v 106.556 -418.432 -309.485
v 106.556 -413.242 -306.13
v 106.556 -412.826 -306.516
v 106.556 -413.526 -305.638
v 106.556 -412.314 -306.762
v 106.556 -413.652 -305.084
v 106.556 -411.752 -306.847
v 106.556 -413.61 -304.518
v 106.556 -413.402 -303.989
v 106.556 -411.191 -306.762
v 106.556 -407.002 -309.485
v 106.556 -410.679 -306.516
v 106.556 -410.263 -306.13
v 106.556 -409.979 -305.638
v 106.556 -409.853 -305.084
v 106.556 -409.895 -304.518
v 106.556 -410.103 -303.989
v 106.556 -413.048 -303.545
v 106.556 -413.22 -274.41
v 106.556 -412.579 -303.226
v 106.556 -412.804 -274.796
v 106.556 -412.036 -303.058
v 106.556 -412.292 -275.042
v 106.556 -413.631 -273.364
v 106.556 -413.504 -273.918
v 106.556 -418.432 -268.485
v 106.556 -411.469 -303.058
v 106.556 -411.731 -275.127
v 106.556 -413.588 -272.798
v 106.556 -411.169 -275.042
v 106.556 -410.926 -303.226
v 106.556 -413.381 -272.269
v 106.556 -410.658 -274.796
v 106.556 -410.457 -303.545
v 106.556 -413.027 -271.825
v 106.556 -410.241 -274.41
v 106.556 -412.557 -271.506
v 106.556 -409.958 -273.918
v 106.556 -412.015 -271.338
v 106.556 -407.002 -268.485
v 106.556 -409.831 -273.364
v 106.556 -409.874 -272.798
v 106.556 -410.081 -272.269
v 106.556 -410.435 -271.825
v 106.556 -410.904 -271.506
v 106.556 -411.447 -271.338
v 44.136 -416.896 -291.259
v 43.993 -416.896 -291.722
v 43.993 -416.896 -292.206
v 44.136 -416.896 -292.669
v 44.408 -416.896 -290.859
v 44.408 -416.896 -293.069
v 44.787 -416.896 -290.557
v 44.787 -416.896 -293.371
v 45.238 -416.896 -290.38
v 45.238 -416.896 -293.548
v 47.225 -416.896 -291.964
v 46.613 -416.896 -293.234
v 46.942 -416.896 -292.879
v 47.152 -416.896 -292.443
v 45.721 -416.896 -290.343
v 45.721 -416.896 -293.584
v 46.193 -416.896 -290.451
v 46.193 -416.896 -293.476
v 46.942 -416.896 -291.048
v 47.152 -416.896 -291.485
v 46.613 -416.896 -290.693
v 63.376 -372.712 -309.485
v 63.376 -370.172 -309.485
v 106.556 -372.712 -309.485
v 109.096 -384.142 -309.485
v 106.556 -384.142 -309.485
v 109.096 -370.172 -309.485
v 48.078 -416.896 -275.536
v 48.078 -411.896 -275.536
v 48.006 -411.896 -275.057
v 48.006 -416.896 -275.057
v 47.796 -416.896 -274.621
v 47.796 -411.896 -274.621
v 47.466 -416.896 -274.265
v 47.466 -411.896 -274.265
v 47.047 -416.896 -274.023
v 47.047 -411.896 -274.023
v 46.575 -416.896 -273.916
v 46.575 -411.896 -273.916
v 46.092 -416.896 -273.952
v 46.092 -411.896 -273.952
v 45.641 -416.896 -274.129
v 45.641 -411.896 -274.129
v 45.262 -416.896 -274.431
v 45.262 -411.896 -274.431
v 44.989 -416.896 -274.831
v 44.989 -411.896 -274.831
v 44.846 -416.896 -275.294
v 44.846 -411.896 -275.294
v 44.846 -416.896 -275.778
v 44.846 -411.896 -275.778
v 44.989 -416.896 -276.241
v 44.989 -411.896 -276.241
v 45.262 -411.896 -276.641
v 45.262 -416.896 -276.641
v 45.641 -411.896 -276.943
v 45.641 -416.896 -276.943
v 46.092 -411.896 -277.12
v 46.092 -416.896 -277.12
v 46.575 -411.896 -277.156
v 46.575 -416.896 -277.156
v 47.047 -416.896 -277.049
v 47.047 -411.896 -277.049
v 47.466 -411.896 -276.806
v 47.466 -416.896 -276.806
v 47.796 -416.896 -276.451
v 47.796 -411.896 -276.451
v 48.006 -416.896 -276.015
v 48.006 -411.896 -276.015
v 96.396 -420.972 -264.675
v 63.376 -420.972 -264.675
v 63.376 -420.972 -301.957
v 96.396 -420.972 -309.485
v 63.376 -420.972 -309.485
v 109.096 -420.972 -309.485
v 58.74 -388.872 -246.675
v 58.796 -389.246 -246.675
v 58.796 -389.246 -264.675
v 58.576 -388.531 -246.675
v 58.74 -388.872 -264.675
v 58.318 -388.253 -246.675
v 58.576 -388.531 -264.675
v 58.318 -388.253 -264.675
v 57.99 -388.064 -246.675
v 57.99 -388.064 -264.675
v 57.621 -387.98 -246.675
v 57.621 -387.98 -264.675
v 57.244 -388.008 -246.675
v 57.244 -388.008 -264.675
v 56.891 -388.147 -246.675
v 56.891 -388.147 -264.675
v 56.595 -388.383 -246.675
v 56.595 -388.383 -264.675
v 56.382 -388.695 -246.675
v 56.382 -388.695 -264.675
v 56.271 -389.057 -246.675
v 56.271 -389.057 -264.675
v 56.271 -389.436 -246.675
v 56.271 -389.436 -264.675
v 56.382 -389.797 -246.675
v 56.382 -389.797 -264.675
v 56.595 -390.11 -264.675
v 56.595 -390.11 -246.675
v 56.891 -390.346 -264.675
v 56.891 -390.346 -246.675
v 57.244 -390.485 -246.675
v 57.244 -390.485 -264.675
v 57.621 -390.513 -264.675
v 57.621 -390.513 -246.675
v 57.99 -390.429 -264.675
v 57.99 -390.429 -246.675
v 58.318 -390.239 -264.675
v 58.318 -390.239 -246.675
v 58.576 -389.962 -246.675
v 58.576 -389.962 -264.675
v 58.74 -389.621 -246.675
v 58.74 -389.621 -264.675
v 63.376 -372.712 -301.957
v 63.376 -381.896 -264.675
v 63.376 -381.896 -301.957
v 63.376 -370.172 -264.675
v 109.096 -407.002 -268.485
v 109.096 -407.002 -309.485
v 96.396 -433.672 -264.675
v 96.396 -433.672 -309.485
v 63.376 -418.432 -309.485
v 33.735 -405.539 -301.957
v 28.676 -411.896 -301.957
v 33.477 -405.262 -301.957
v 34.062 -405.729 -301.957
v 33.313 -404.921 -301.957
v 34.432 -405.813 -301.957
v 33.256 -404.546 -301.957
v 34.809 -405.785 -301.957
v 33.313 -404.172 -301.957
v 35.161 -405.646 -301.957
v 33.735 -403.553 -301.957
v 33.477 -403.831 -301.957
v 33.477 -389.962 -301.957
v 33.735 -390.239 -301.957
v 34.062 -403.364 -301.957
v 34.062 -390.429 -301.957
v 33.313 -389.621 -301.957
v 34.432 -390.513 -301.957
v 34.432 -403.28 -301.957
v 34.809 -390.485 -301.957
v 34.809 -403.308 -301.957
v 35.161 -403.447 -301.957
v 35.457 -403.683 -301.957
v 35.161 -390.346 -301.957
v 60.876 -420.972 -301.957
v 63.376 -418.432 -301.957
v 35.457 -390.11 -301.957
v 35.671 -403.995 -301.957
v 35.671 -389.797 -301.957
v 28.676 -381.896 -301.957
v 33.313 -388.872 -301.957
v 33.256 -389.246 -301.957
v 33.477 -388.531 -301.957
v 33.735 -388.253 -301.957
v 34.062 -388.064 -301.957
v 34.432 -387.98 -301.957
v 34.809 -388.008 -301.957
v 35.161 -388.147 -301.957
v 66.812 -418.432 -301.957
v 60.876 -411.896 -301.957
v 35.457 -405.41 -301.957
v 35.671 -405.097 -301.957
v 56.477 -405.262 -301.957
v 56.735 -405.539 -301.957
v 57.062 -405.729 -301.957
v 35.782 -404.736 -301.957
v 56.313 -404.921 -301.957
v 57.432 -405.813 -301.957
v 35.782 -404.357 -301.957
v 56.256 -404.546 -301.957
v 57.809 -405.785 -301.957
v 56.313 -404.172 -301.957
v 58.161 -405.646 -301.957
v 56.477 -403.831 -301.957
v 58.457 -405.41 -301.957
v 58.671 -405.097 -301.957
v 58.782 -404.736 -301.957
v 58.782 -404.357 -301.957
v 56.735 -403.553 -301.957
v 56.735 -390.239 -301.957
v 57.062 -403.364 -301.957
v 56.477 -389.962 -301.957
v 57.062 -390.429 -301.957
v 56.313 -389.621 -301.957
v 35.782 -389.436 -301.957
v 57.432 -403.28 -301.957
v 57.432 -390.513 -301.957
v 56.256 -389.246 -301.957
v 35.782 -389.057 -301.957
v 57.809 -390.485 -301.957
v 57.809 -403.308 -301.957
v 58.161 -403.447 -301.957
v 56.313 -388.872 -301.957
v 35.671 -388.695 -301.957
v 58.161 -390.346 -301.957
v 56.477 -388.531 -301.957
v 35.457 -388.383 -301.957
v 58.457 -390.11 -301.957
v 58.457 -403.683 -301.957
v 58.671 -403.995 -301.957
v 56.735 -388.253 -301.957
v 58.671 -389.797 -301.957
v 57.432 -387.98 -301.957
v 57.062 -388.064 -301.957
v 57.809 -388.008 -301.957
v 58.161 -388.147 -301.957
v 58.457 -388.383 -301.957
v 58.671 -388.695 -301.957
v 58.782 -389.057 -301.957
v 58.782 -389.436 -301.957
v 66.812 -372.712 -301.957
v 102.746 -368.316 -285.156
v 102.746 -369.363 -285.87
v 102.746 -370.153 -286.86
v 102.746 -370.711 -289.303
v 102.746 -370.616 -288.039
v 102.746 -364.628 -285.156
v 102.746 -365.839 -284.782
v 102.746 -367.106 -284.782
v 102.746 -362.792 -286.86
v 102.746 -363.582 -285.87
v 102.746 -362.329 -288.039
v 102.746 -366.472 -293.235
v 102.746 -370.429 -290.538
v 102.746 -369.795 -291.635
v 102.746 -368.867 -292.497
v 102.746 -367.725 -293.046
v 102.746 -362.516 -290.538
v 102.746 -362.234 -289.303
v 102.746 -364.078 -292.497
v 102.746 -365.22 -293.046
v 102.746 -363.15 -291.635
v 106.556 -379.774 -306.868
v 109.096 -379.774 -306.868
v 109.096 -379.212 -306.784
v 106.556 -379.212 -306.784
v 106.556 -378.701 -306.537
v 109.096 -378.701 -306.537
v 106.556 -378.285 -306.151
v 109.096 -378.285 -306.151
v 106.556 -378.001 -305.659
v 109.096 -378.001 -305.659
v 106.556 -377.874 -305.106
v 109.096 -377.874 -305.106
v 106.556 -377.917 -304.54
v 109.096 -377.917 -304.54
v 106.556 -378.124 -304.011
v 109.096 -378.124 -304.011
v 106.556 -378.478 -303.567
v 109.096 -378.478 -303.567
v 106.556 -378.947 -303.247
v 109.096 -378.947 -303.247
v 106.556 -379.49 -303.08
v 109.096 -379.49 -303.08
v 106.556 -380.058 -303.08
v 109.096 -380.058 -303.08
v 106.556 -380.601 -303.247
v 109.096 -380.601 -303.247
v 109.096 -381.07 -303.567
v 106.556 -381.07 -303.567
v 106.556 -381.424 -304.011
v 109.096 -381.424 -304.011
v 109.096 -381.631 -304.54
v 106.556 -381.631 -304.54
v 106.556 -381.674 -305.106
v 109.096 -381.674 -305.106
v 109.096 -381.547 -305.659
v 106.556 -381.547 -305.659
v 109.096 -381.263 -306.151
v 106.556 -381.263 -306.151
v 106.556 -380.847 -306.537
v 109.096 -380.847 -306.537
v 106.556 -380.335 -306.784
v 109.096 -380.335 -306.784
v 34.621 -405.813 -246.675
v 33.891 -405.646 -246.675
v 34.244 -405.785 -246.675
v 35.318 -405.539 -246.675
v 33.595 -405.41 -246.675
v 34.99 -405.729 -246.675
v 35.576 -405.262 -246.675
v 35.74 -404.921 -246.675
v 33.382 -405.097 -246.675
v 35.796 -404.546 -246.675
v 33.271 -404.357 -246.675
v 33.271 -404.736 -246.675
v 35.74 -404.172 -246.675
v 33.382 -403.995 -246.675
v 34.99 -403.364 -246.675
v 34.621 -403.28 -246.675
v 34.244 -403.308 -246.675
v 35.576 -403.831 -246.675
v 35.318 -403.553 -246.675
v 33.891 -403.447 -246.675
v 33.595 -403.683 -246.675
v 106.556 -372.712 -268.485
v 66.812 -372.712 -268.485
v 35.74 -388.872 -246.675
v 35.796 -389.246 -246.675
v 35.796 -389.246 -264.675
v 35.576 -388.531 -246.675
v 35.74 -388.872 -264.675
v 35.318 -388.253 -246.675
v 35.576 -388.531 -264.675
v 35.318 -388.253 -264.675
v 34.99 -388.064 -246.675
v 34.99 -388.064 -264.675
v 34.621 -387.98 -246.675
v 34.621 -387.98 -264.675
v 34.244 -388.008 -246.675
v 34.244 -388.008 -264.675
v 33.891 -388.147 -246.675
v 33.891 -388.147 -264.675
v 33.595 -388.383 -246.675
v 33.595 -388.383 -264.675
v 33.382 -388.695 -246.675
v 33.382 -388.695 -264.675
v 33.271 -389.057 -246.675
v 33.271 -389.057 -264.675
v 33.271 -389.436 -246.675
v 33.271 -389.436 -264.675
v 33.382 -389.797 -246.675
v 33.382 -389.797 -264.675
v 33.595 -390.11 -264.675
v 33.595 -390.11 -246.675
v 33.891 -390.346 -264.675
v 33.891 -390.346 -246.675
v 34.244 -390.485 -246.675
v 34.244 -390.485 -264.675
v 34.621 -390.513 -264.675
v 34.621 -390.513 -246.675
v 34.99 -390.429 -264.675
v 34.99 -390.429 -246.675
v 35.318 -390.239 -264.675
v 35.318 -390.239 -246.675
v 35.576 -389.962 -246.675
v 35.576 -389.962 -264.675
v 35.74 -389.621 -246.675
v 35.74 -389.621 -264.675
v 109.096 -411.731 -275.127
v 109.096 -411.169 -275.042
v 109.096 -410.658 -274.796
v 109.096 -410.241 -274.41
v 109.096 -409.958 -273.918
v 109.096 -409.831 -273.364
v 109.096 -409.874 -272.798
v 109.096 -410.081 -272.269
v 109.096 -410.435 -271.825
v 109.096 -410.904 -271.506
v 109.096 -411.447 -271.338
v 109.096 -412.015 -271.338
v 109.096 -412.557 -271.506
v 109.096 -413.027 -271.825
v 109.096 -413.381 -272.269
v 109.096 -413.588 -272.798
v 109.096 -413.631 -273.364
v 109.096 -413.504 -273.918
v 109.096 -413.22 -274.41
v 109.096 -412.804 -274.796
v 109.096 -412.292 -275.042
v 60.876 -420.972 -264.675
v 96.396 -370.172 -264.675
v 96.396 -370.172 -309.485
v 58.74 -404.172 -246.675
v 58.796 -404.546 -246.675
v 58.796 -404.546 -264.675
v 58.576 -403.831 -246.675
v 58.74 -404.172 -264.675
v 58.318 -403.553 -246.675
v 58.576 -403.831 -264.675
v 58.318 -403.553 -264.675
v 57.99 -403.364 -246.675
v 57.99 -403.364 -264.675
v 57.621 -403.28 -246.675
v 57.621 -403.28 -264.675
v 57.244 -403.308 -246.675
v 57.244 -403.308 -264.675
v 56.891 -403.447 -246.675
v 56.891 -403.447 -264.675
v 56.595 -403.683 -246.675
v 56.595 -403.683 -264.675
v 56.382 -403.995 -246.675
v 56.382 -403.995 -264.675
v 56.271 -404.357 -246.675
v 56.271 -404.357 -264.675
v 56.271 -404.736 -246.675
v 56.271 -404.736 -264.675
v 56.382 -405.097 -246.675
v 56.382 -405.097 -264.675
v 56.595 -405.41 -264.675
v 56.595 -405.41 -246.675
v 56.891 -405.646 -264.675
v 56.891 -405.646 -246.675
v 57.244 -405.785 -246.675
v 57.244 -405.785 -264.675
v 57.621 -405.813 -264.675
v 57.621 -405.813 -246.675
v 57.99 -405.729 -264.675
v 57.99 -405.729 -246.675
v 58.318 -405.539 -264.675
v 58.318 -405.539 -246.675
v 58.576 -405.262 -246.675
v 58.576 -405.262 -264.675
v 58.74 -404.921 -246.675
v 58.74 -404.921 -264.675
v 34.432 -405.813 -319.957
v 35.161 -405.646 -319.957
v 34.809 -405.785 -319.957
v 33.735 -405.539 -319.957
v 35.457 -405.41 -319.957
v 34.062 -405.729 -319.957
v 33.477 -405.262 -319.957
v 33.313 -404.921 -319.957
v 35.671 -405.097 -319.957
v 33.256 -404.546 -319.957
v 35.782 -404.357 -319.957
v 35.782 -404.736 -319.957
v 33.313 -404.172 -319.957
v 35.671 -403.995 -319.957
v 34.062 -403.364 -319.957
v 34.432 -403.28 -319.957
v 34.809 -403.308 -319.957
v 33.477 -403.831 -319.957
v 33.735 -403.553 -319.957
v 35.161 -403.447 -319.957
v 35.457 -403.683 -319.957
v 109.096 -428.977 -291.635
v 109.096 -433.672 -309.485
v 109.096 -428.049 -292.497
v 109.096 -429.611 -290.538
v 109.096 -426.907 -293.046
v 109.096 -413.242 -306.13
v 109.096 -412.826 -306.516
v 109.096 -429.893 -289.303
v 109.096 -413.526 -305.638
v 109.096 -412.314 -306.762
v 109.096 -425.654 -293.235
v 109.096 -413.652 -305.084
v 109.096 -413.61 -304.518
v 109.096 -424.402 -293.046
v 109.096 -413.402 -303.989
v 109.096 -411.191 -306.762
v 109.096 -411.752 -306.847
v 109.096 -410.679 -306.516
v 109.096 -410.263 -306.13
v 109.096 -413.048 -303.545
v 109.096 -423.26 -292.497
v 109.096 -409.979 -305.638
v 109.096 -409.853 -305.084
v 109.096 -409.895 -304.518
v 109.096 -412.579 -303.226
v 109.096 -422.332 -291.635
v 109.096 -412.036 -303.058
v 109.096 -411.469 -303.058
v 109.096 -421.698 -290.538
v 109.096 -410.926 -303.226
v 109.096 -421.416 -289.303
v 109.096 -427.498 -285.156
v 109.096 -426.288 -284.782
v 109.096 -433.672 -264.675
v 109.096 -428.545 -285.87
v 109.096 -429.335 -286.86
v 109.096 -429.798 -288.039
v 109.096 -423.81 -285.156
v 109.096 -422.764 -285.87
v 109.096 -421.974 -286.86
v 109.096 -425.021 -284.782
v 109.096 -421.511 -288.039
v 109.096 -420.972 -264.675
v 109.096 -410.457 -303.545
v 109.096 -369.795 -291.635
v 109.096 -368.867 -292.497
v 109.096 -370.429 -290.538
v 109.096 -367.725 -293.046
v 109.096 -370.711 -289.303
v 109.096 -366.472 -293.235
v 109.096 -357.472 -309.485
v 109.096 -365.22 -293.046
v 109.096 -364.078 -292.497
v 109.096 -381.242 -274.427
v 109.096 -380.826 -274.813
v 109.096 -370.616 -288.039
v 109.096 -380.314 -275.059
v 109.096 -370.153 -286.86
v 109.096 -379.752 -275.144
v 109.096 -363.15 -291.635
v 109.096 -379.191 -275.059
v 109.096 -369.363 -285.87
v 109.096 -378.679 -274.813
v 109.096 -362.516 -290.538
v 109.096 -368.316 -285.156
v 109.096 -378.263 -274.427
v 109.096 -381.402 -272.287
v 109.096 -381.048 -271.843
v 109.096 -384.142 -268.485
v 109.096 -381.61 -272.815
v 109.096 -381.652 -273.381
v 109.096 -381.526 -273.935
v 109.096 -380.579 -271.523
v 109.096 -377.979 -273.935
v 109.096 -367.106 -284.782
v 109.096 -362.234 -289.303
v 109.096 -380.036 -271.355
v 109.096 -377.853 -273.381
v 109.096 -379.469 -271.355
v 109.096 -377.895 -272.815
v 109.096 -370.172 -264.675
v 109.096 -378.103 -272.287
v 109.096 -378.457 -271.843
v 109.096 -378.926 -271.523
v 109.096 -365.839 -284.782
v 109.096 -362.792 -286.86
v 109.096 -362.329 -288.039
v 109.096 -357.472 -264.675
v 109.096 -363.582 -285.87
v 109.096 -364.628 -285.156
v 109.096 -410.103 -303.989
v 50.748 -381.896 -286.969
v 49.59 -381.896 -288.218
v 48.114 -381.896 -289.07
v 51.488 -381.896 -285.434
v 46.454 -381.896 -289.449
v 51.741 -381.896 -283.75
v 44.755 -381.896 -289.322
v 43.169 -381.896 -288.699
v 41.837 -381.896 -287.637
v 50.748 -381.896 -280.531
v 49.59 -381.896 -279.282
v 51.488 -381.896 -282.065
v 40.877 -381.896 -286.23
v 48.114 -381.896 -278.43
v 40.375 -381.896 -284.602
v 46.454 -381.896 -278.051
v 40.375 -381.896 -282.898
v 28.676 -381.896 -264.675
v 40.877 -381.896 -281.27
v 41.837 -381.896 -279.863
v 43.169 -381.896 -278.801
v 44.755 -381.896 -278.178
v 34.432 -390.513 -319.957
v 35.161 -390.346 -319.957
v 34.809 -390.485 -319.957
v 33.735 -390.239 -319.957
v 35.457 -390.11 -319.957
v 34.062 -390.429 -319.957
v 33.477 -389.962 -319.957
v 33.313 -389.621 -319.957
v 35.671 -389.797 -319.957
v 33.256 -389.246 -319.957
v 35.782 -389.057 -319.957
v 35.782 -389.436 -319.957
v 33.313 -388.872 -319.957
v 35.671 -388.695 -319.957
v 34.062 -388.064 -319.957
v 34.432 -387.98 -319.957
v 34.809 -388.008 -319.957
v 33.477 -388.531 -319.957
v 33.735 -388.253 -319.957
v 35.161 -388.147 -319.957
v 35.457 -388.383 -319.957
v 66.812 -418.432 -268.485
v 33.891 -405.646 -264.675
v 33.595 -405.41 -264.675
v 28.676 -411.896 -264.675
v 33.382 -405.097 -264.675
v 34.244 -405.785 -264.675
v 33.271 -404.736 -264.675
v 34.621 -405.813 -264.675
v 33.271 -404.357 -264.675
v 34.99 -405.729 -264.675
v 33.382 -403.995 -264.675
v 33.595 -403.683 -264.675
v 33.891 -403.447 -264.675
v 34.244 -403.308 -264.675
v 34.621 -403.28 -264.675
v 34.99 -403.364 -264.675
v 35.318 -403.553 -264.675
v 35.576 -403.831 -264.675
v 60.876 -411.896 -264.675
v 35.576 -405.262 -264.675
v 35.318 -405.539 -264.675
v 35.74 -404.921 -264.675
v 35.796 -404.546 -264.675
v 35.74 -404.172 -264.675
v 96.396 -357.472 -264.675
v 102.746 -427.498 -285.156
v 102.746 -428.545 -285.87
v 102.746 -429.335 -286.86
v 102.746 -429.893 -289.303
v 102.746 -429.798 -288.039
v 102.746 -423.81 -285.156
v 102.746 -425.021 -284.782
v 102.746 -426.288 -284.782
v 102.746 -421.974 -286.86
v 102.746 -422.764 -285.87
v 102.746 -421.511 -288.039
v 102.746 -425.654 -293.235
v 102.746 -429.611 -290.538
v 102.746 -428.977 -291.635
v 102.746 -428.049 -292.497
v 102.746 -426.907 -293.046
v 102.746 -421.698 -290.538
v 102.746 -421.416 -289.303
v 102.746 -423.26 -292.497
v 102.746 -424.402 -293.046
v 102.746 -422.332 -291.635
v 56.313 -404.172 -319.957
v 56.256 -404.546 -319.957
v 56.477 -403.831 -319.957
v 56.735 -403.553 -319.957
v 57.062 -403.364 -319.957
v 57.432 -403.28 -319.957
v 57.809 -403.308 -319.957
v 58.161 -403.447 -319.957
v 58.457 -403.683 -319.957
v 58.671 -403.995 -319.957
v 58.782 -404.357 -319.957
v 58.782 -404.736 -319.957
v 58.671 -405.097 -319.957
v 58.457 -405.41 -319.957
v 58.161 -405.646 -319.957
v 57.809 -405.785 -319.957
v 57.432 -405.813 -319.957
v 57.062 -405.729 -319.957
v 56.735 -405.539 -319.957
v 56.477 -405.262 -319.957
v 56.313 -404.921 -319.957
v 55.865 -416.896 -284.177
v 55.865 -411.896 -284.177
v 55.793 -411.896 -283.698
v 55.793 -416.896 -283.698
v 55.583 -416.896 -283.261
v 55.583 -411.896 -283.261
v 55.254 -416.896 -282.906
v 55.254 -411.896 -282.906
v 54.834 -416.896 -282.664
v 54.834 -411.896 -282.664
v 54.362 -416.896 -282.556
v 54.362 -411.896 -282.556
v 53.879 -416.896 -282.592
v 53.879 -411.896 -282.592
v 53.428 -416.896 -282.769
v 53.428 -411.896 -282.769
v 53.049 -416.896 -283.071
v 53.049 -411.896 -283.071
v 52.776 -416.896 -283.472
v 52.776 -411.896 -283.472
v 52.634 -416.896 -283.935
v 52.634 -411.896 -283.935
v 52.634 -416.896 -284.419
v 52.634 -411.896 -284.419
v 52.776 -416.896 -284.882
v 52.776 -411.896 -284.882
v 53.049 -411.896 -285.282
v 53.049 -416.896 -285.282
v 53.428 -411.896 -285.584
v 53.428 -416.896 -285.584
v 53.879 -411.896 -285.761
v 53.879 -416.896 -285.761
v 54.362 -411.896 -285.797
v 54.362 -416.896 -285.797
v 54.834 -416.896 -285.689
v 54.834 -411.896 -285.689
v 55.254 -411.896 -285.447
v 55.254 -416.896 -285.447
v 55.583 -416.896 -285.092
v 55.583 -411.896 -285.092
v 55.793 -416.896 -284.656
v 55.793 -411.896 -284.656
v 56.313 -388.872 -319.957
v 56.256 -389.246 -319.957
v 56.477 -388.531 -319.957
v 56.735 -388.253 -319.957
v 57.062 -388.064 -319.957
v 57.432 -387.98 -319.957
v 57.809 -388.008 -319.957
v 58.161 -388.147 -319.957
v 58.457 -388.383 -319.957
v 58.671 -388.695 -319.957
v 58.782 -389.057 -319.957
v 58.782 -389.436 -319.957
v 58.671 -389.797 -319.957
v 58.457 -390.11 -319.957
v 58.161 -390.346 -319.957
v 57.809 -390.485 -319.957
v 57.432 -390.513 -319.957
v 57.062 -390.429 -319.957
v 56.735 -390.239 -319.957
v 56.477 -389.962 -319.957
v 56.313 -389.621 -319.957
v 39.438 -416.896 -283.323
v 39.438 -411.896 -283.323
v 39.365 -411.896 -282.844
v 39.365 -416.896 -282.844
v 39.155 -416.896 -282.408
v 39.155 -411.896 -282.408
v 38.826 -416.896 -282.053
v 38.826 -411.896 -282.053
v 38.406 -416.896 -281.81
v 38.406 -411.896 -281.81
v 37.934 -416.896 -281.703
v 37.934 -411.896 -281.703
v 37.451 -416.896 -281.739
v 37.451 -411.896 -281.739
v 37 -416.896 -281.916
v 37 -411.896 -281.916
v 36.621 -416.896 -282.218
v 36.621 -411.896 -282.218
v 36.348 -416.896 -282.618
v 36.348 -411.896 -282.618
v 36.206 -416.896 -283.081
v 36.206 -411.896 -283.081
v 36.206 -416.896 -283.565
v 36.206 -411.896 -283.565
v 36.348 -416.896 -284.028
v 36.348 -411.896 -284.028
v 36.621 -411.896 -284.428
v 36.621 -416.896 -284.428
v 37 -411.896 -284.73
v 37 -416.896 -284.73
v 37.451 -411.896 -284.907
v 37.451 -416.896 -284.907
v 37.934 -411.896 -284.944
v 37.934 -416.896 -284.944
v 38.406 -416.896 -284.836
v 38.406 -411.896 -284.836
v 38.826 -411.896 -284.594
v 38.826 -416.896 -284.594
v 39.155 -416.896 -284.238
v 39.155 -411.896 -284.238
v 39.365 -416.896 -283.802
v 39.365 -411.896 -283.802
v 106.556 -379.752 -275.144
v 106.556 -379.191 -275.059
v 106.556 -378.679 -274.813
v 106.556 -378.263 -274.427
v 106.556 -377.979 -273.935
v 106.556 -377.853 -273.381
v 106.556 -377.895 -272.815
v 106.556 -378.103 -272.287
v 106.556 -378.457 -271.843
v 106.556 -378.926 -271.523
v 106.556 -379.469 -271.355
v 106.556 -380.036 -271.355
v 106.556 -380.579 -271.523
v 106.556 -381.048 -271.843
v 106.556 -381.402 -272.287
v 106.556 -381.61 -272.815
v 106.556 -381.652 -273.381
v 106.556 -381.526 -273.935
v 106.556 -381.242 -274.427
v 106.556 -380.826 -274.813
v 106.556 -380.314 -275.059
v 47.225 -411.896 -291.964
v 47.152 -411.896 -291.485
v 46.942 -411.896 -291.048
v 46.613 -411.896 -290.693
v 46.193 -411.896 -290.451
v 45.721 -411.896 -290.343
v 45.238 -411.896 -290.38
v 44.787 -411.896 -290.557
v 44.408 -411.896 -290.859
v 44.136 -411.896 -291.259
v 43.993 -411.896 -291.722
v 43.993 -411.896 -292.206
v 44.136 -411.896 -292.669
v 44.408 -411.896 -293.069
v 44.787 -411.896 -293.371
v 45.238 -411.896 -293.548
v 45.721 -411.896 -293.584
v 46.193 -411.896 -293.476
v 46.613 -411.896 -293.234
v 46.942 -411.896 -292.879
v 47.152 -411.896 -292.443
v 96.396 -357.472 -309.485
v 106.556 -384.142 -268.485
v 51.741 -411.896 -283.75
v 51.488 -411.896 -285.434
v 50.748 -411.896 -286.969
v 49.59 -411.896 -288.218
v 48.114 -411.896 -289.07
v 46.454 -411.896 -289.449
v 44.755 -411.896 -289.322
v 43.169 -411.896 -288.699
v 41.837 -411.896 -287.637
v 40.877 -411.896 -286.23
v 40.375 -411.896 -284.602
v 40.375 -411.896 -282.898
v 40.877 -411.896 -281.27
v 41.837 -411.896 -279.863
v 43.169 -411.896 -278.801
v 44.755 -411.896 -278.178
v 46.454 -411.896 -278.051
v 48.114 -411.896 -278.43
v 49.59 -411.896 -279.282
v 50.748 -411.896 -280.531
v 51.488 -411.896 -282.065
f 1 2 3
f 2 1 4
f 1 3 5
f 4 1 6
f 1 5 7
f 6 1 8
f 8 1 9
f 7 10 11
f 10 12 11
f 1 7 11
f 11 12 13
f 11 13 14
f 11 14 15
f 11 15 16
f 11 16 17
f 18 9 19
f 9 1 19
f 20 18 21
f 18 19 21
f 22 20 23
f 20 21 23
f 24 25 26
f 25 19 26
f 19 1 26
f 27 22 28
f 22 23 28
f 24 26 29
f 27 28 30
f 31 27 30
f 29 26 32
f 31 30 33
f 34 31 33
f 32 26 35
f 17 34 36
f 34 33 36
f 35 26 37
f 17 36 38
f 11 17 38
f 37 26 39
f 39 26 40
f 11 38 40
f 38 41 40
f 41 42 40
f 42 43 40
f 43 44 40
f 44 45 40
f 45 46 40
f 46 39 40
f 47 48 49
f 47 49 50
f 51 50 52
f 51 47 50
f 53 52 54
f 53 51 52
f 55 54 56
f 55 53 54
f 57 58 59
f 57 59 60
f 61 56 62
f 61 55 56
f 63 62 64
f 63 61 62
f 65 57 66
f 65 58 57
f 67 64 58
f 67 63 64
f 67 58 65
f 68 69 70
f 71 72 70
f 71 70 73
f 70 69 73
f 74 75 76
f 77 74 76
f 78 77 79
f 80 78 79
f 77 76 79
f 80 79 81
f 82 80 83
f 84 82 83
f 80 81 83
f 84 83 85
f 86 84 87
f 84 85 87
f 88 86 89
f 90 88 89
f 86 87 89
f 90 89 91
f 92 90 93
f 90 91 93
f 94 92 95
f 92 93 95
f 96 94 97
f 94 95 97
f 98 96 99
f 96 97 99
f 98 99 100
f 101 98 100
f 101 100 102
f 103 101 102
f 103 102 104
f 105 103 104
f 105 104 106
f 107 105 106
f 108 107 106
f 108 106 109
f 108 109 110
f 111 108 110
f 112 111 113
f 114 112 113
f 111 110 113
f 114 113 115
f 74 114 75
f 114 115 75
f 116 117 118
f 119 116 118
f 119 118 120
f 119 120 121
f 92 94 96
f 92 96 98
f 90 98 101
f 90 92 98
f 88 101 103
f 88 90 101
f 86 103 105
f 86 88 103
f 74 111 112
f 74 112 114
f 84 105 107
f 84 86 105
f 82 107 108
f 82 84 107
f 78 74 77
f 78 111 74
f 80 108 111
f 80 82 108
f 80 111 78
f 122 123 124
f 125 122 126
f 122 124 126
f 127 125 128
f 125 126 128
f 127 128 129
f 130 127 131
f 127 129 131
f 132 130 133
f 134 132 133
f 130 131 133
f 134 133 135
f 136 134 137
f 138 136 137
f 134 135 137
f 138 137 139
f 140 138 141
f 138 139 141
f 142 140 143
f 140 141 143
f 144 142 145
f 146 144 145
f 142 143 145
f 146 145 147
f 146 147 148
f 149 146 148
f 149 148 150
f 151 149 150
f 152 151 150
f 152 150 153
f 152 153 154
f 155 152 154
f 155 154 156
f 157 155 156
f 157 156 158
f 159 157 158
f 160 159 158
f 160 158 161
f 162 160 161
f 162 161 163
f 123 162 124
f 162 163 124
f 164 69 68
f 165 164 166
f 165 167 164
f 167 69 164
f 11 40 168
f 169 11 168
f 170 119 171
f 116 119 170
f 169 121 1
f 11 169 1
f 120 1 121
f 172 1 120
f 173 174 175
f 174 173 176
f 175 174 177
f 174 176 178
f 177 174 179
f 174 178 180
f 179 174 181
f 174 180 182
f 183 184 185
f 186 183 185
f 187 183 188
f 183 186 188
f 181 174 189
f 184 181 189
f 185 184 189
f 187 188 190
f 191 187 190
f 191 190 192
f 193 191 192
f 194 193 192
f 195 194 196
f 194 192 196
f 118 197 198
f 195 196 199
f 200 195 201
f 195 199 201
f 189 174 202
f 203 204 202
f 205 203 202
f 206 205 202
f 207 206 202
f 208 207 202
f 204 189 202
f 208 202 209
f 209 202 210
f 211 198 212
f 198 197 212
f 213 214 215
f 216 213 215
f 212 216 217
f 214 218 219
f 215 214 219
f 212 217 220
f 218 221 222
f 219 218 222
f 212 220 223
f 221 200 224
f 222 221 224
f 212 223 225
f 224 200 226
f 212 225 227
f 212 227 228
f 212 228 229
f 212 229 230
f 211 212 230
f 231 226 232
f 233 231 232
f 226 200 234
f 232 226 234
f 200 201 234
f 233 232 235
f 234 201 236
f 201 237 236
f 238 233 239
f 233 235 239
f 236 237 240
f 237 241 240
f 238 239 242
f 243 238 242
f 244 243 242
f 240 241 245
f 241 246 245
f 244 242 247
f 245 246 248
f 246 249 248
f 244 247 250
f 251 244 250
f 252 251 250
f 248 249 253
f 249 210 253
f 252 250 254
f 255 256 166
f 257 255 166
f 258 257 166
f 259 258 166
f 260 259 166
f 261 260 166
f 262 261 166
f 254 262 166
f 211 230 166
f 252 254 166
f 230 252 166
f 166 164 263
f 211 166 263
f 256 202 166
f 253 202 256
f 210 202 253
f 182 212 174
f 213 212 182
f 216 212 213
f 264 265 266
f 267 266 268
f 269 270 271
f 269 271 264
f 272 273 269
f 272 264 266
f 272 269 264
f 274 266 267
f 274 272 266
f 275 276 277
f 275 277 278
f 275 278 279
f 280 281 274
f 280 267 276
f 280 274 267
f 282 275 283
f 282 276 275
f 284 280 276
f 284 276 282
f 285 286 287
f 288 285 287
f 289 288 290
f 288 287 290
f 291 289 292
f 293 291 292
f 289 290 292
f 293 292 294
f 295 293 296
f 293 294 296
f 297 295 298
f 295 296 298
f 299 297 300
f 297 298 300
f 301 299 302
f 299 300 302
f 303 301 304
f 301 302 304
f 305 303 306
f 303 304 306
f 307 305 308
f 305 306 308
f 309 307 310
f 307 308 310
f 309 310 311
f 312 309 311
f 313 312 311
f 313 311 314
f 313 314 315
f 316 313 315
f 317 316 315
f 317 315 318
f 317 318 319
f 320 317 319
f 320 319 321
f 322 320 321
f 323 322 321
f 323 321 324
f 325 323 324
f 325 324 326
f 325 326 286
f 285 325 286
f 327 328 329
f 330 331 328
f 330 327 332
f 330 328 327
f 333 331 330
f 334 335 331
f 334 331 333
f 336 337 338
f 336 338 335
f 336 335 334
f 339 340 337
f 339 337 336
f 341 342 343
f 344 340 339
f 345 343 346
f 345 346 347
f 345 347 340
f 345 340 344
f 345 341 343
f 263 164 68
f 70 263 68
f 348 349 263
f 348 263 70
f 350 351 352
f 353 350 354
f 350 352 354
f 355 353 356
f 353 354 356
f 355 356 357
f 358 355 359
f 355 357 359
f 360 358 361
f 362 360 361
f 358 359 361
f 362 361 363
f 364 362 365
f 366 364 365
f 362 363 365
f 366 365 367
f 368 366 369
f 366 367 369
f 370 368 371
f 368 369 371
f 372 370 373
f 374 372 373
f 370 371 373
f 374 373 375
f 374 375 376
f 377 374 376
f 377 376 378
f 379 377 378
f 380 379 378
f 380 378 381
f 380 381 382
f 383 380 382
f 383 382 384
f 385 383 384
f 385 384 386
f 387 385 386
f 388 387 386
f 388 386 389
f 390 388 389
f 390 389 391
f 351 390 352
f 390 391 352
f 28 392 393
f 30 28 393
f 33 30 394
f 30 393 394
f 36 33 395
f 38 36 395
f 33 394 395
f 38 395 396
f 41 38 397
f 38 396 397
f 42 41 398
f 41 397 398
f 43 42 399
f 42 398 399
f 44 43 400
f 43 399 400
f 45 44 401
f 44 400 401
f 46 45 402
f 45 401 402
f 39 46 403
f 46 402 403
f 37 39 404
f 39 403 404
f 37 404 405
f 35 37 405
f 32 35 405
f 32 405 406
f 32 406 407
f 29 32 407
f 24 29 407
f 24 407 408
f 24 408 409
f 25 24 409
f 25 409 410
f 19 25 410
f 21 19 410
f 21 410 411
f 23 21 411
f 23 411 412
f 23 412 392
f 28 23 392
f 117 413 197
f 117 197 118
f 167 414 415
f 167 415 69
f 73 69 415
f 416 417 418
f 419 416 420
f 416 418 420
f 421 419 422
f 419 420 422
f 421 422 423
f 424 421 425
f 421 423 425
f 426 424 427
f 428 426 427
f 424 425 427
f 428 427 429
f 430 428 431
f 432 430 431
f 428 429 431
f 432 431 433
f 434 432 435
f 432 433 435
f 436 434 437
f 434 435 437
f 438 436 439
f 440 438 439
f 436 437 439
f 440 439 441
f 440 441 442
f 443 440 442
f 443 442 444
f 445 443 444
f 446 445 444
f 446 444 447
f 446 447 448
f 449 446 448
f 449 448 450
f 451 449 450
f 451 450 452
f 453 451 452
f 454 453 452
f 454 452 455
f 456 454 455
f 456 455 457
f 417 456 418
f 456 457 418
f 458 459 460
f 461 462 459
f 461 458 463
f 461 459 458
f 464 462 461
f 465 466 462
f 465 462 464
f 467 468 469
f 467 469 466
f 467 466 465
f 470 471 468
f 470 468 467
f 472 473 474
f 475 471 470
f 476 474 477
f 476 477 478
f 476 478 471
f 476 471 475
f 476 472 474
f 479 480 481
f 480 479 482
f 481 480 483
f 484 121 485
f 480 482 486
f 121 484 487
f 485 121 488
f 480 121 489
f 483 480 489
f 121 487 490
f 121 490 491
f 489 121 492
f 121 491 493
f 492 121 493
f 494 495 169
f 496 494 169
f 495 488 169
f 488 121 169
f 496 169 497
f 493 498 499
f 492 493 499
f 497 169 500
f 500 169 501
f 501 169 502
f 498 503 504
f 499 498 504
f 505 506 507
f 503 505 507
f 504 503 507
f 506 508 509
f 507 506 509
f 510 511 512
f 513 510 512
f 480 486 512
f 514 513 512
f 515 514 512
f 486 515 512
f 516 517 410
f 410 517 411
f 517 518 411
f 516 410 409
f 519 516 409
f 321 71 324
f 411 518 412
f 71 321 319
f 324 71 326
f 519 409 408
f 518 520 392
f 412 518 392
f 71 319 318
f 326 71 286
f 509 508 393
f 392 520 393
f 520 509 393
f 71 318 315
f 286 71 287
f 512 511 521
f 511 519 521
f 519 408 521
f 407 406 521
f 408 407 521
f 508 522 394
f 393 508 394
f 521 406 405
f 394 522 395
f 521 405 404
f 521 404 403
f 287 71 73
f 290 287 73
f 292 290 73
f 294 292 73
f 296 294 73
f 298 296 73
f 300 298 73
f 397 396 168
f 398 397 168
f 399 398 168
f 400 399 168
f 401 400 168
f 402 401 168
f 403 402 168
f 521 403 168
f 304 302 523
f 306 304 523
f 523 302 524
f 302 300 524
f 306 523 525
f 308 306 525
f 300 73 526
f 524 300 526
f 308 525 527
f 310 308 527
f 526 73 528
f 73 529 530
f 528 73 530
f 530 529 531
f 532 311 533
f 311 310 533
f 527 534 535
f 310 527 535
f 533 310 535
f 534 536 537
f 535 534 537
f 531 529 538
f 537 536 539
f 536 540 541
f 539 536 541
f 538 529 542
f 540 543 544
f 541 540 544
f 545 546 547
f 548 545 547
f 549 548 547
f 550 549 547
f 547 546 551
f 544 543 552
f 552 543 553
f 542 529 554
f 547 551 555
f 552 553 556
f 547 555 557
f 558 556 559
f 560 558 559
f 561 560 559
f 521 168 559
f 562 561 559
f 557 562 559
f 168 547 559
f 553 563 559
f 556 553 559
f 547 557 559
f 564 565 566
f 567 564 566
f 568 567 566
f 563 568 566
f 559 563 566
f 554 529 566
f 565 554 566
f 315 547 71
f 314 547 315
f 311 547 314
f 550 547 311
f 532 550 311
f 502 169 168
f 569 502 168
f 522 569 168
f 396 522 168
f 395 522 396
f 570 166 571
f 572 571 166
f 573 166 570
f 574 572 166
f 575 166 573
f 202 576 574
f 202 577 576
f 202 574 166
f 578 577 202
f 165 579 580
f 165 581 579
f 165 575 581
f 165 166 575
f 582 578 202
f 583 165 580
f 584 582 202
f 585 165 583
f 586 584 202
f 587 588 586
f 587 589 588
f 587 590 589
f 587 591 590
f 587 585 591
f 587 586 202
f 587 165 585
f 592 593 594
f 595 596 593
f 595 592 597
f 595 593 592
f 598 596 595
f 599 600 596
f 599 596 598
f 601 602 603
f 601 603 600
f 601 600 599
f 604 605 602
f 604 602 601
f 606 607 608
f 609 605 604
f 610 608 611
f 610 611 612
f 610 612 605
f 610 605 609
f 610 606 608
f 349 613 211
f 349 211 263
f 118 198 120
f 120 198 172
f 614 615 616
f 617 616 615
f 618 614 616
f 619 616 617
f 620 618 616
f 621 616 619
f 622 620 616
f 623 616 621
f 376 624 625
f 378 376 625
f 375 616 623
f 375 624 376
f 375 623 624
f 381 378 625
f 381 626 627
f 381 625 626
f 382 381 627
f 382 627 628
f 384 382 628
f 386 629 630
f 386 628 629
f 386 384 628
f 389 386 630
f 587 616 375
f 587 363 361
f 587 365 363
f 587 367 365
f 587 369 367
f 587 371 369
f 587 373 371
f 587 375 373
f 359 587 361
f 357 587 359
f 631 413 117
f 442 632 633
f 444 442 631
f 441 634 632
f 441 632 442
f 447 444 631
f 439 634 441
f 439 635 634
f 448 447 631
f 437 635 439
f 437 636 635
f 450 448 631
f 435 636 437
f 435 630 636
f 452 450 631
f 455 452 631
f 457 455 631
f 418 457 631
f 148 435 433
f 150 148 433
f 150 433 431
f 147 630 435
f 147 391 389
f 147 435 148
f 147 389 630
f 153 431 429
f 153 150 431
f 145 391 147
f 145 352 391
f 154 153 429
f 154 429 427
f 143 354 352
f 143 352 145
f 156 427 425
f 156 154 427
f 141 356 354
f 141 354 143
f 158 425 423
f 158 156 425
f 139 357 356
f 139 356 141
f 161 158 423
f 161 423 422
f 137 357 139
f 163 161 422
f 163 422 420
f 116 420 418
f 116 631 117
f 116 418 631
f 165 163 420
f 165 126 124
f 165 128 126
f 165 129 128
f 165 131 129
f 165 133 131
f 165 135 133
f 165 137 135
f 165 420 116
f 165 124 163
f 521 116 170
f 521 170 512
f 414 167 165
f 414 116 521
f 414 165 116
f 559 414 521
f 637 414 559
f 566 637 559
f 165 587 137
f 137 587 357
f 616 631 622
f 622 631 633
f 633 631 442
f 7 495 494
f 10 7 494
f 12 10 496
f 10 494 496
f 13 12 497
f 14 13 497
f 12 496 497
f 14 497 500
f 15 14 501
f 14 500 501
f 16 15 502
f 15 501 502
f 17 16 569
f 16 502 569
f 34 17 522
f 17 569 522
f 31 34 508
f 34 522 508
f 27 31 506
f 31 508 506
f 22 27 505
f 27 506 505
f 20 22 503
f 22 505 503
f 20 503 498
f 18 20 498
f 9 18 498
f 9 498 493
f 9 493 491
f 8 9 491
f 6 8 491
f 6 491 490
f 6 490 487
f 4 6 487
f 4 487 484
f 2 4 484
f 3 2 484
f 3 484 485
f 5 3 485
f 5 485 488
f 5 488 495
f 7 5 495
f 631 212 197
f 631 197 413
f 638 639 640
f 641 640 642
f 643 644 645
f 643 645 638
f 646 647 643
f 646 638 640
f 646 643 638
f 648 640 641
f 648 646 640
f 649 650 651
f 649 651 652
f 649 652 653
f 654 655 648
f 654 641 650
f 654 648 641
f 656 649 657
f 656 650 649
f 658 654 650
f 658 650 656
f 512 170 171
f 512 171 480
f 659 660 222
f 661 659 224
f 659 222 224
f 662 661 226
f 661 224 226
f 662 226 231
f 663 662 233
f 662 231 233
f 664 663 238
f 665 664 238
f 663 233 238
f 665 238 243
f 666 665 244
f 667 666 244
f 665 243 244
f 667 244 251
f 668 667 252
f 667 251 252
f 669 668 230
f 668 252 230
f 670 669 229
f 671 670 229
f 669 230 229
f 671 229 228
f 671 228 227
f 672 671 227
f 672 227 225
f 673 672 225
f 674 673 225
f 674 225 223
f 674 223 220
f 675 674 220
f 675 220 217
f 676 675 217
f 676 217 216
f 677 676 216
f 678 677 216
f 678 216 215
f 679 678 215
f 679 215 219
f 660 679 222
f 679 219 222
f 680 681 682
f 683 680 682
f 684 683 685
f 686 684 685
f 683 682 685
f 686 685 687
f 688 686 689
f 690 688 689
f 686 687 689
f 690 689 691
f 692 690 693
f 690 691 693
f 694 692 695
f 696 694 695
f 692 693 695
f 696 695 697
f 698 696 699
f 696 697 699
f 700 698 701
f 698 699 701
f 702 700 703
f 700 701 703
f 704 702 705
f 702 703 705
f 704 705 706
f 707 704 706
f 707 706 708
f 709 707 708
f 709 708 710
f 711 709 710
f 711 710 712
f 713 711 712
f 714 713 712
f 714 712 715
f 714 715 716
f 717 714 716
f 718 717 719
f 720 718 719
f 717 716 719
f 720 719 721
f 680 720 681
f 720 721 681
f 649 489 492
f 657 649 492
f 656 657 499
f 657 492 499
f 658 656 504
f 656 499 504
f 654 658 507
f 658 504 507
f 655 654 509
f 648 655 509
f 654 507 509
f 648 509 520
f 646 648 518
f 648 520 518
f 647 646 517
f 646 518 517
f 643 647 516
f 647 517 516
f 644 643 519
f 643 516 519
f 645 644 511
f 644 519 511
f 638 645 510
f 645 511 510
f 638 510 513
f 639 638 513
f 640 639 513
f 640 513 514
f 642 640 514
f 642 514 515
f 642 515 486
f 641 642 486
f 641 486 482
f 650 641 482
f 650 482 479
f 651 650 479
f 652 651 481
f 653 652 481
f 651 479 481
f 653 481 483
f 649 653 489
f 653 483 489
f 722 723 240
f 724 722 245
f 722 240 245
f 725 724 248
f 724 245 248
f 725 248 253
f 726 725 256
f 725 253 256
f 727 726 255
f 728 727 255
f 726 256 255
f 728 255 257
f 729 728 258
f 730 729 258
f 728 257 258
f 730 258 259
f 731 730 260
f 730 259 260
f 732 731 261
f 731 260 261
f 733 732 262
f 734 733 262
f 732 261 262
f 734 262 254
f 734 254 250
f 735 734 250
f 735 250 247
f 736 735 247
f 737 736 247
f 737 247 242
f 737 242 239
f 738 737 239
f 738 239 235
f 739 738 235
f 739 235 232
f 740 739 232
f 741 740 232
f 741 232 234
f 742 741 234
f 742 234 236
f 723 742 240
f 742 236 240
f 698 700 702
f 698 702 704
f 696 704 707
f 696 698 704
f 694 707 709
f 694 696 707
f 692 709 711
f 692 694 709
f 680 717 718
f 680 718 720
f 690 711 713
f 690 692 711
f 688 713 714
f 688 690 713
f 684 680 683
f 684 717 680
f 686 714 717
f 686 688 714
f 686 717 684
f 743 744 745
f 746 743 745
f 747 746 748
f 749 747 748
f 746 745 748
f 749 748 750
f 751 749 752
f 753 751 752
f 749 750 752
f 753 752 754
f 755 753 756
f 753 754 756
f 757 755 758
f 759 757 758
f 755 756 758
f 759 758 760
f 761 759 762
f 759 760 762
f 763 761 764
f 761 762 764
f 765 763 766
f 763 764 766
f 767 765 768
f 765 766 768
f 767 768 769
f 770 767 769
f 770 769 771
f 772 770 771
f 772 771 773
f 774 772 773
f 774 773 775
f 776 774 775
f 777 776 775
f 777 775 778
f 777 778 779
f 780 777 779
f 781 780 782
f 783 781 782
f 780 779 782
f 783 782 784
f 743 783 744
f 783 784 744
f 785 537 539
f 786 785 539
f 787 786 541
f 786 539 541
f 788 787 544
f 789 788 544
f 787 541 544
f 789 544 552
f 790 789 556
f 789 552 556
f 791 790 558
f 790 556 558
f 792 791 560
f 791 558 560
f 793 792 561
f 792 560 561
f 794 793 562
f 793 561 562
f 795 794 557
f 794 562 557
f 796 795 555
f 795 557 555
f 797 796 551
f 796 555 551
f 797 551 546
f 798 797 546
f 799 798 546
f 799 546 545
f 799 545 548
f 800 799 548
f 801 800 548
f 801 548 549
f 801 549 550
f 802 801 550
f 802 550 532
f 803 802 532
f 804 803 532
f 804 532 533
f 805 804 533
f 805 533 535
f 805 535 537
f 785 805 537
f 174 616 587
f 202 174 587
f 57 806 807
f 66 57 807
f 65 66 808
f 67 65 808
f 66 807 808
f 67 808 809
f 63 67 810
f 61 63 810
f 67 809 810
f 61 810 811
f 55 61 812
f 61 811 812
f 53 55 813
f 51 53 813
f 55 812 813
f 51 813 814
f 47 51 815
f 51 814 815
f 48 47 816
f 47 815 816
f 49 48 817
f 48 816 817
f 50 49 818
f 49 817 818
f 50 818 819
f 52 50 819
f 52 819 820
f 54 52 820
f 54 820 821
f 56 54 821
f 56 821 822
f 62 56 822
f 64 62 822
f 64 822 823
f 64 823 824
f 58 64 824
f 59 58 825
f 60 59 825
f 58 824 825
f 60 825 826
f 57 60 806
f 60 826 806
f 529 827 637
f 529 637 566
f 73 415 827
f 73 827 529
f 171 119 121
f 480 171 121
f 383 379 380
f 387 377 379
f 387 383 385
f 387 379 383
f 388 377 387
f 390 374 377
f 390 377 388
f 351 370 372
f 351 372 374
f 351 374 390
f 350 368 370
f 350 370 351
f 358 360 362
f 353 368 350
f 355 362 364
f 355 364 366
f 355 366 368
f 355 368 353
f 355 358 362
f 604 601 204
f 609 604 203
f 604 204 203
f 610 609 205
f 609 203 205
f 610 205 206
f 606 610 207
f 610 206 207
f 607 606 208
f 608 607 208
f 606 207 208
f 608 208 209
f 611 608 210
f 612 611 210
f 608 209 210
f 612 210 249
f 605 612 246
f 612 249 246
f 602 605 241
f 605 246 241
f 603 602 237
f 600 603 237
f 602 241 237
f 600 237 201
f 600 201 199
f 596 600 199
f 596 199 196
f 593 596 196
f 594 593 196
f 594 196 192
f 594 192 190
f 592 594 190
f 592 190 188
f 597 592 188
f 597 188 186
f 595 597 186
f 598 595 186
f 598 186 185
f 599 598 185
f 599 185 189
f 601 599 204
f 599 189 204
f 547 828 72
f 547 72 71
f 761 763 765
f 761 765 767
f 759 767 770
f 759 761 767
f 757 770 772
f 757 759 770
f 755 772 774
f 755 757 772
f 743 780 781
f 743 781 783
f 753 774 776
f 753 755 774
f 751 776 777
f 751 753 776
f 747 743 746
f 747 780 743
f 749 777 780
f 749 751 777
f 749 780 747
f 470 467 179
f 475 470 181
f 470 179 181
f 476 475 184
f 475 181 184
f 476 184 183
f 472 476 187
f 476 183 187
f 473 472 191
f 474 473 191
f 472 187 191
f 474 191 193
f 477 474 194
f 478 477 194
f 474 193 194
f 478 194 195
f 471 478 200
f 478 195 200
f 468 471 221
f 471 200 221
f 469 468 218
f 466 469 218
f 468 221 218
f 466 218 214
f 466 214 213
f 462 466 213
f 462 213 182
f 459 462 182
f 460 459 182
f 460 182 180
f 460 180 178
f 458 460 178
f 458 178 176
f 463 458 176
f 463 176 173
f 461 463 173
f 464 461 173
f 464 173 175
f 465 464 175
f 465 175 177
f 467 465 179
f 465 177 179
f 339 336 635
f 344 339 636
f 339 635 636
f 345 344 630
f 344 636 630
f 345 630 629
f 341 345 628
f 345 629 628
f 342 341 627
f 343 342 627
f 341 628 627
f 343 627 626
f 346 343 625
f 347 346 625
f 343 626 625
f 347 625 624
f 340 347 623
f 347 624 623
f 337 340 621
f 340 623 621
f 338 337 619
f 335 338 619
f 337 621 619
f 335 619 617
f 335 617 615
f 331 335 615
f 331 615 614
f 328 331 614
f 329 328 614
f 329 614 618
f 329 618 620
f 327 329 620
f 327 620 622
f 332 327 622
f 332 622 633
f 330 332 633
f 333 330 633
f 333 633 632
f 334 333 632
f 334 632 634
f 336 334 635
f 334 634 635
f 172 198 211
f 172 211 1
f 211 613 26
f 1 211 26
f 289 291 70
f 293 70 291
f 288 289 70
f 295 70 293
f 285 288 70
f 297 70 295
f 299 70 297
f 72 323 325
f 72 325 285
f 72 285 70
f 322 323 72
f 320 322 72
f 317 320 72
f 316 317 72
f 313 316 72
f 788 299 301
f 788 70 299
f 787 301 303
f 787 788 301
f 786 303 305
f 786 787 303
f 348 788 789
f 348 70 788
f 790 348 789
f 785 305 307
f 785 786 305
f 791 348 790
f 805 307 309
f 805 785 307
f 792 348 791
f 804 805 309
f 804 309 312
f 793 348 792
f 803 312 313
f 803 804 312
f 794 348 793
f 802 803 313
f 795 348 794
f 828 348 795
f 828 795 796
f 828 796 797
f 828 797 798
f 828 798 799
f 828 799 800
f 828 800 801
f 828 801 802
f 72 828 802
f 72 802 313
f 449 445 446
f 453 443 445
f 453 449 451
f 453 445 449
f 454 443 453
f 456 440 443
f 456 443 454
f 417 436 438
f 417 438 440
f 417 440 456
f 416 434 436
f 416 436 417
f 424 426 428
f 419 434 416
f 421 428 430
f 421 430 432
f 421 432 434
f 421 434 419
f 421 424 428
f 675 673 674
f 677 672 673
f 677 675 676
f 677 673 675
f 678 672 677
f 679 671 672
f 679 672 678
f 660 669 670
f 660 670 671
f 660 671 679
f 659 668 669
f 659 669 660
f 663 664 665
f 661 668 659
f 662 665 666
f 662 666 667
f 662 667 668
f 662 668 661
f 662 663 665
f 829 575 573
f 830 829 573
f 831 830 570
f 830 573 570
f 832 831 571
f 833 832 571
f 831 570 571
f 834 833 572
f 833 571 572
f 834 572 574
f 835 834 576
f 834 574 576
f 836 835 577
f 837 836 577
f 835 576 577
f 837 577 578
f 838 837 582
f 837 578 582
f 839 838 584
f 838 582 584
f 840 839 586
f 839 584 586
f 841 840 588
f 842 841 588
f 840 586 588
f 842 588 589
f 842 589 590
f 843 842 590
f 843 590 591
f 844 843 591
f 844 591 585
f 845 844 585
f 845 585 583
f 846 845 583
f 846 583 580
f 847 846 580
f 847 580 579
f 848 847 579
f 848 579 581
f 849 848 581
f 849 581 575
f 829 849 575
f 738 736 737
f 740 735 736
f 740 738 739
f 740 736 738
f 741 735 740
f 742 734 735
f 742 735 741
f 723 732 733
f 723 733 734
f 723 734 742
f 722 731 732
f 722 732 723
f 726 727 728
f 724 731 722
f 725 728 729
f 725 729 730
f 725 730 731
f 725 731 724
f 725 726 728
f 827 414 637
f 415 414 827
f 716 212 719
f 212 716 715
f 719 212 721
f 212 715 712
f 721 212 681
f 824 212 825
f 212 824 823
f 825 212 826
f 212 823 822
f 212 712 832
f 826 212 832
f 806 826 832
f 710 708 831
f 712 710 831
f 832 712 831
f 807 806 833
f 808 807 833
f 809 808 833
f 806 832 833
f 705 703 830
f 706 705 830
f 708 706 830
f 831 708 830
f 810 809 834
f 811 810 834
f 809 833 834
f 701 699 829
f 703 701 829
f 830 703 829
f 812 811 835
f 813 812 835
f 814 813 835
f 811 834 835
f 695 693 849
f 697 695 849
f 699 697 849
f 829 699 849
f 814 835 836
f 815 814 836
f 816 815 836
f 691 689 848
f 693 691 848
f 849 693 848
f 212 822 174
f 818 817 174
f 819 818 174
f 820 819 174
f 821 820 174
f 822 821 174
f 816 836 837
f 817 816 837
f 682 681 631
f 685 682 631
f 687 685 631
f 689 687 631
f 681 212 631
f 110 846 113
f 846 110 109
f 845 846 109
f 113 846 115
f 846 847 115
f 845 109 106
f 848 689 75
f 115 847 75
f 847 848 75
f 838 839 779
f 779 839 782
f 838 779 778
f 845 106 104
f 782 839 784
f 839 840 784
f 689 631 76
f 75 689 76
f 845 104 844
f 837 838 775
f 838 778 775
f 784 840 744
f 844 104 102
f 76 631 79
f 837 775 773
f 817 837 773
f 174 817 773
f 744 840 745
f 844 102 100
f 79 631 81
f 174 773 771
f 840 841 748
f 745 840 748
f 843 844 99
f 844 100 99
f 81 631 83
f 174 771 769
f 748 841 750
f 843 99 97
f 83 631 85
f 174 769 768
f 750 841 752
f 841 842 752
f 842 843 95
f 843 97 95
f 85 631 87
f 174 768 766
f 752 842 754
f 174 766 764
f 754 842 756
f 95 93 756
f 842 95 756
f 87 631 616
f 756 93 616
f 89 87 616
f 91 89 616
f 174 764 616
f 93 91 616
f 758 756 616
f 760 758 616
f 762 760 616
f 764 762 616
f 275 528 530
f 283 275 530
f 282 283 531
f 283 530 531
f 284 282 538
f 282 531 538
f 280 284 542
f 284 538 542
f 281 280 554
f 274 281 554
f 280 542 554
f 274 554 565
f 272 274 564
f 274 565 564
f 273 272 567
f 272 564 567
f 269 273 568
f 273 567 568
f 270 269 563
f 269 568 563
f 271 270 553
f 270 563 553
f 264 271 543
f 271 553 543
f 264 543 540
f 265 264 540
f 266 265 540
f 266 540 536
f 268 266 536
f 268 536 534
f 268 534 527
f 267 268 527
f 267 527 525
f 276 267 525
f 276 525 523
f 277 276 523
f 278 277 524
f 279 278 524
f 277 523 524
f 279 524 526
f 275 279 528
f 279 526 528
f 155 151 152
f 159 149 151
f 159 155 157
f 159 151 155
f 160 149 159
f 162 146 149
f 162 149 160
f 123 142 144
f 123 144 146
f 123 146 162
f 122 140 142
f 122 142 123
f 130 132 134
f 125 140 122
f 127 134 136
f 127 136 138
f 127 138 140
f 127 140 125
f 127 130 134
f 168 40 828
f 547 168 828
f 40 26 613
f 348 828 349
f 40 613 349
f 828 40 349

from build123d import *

# Parameters (mm, degrees)
SKETCH1_W            = 34.7
SKETCH1_H            = 30
BOSS_EXTRUDE1_DEPTH  = 37.282
SKETCH2_R            = 1.27
BOSS_EXTRUDE2_DEPTH  = 18
SKETCH4_R            = 5.715
CUT_EXTRUDE1_DEPTH   = 31
SKETCH5_R            = 1.625
BOSS_EXTRUDE4_DEPTH  = 5
SKETCH6_R            = 1.27
BOSS_EXTRUDE5_DEPTH  = 18
SKETCH8_W            = 3.81
SKETCH8_H            = 50.8
BOSS_EXTRUDE6_DEPTH  = 45.72
BOSS_EXTRUDE7_DEPTH  = 41.000001
CUT_EXTRUDE2_REACH   = 82.42
SKETCH10_R           = 1.905
SKETCH11_W           = 12.7
SKETCH11_H           = 44.810000611
BOSS_EXTRUDE8_DEPTH  = 12.7
SKETCH12_W           = 12.7
SKETCH12_H           = 44.810000611
BOSS_EXTRUDE9_DEPTH  = 12.7
SKETCH13_R           = 4.25
CUT_EXTRUDE3_DEPTH   = 6.35
SKETCH17_W           = 3.43592392
SKETCH17_H           = 45.72
BOSS_EXTRUDE12_DEPTH = 33.472
SKETCH16_W           = 2.5
SKETCH16_H           = 37.282
BOSS_EXTRUDE11_DEPTH = 9.076061


with BuildPart() as part:
    # Sketch1 → Boss-Extrude1 (new body)
    with BuildSketch(Plane(origin=(0, 0, -264.675), x_dir=(-1, 0, 0), z_dir=(0, 0, -1))):
        with Locations((-46.026450848, -396.896376681)):
            Rectangle(SKETCH1_W, SKETCH1_H)
    extrude(amount=BOSS_EXTRUDE1_DEPTH)

    # Sketch2 → Boss-Extrude2 (add)
    with BuildSketch(Plane.XY.offset(-264.675)):
        with Locations((34.526450848, -389.246376681)):
            Circle(SKETCH2_R)
        with Locations((57.526450848, -389.246376681)):
            Circle(SKETCH2_R)
        with Locations((57.526450848, -404.546376681)):
            Circle(SKETCH2_R)
        with Locations((34.526450848, -404.546376681)):
            Circle(SKETCH2_R)
    extrude(amount=BOSS_EXTRUDE2_DEPTH)

    # Sketch4 → Cut-Extrude1 (cut, through all)
    with BuildSketch(Plane(origin=(0, -381.896376681, 0), x_dir=(1, 0, 0), z_dir=(0, 1, 0))):
        with Locations((46.026450848, 283.749893694)):
            Circle(SKETCH4_R)
    extrude(amount=-CUT_EXTRUDE1_DEPTH, mode=Mode.SUBTRACT)

    # Sketch5 → Boss-Extrude4 (add)
    with BuildSketch(Plane.XZ.offset(411.896376681)):
        with Locations((46.453266338, -275.535975412)):
            Circle(SKETCH5_R)
        with Locations((54.24036913, -284.176709184)):
            Circle(SKETCH5_R)
        with Locations((45.599635358, -291.963811975)):
            Circle(SKETCH5_R)
        with Locations((37.812532567, -283.323078204)):
            Circle(SKETCH5_R)
    extrude(amount=BOSS_EXTRUDE4_DEPTH)

    # Sketch6 → Boss-Extrude5 (add)
    with BuildSketch(Plane(origin=(0, 0, -301.957), x_dir=(-1, 0, 0), z_dir=(0, 0, -1))):
        with Locations((-57.526450848, -389.246376681)):
            Circle(SKETCH6_R)
        with Locations((-34.526450848, -389.246376681)):
            Circle(SKETCH6_R)
        with Locations((-34.526450848, -404.546376681)):
            Circle(SKETCH6_R)
        with Locations((-57.526450848, -404.546376681)):
            Circle(SKETCH6_R)
    extrude(amount=BOSS_EXTRUDE5_DEPTH)

    # Sketch8 → Boss-Extrude6 (add)
    with BuildSketch(Plane(origin=(63.376450848, 0, 0), x_dir=(0, 0, -1), z_dir=(1, 0, 0))):
        with Locations((266.58, -395.572437442)):
            Rectangle(SKETCH8_W, SKETCH8_H)
    extrude(amount=BOSS_EXTRUDE6_DEPTH)

    # Sketch9 → Boss-Extrude7 (add)
    with BuildSketch(Plane(origin=(0, 0, -268.485), x_dir=(-1, 0, 0), z_dir=(0, 0, -1))):
        Polygon((-109.096450848, -370.172437442), (-63.376450848, -370.172437442), (-63.376450848, -372.712437442), (-106.556450848, -372.712437442), (-106.556450848, -384.142437442), (-109.096450848, -384.142437442), (-109.096450848, -372.712437442), align=None)
        Polygon((-109.096450848, -420.972437442), (-63.376450848, -420.972437442), (-63.376450848, -418.432437442), (-106.556450848, -418.432437442), (-106.556450848, -407.002437442), (-109.096450848, -407.002437442), (-109.096450848, -418.432437442), align=None)
    extrude(amount=BOSS_EXTRUDE7_DEPTH)

    # Sketch10 → Cut-Extrude2 (cut, up to next)
    with BuildSketch(Plane(origin=(109.096450848, 0, 0), x_dir=(0, 0, -1), z_dir=(1, 0, 0)), mode=Mode.PRIVATE) as cut_extrude2_sk1:
        with Locations((304.963451053, -379.773986799)):
            Circle(SKETCH10_R)
    cut_extrude2_tool1 = extrude(cut_extrude2_sk1.sketch, amount=-CUT_EXTRUDE2_REACH, mode=Mode.PRIVATE) & part.part
    add(cut_extrude2_tool1.solids().sort_by_distance((109.096451, -379.773987, -304.963451))[0], mode=Mode.SUBTRACT)
    # Sketch10 → Cut-Extrude2 (cut, up to next)
    with BuildSketch(Plane(origin=(109.096450848, 0, 0), x_dir=(0, 0, -1), z_dir=(1, 0, 0)), mode=Mode.PRIVATE) as cut_extrude2_sk2:
        with Locations((304.941901697, -411.752437852)):
            Circle(SKETCH10_R)
    cut_extrude2_tool2 = extrude(cut_extrude2_sk2.sketch, amount=-CUT_EXTRUDE2_REACH, mode=Mode.PRIVATE) & part.part
    add(cut_extrude2_tool2.solids().sort_by_distance((109.096451, -411.752438, -304.941902))[0], mode=Mode.SUBTRACT)
    # Sketch10 → Cut-Extrude2 (cut, up to next)
    with BuildSketch(Plane(origin=(109.096450848, 0, 0), x_dir=(0, 0, -1), z_dir=(1, 0, 0)), mode=Mode.PRIVATE) as cut_extrude2_sk3:
        with Locations((273.239000003, -379.752437442)):
            Circle(SKETCH10_R)
    cut_extrude2_tool3 = extrude(cut_extrude2_sk3.sketch, amount=-CUT_EXTRUDE2_REACH, mode=Mode.PRIVATE) & part.part
    add(cut_extrude2_tool3.solids().sort_by_distance((109.096451, -379.752437, -273.239))[0], mode=Mode.SUBTRACT)
    # Sketch10 → Cut-Extrude2 (cut, up to next)
    with BuildSketch(Plane(origin=(109.096450848, 0, 0), x_dir=(0, 0, -1), z_dir=(1, 0, 0)), mode=Mode.PRIVATE) as cut_extrude2_sk4:
        with Locations((273.221901697, -411.730888495)):
            Circle(SKETCH10_R)
    cut_extrude2_tool4 = extrude(cut_extrude2_sk4.sketch, amount=-CUT_EXTRUDE2_REACH, mode=Mode.PRIVATE) & part.part
    add(cut_extrude2_tool4.solids().sort_by_distance((109.096451, -411.730888, -273.221902))[0], mode=Mode.SUBTRACT)

    # Sketch11 → Boss-Extrude8 (add)
    with BuildSketch(Plane(origin=(0, -370.172437442, 0), x_dir=(1, 0, 0), z_dir=(0, 1, 0))):
        with Locations((102.746450848, 287.080000305)):
            Rectangle(SKETCH11_W, SKETCH11_H)
    extrude(amount=BOSS_EXTRUDE8_DEPTH)

    # Sketch12 → Boss-Extrude9 (add)
    with BuildSketch(Plane.XZ.offset(420.972437442)):
        with Locations((102.746450848, -287.080000305)):
            Rectangle(SKETCH12_W, SKETCH12_H)
    extrude(amount=BOSS_EXTRUDE9_DEPTH)

    # Sketch13 → Cut-Extrude3 (cut)
    with BuildSketch(Plane(origin=(109.096450848, 0, 0), x_dir=(0, 0, -1), z_dir=(1, 0, 0))):
        with Locations((288.985000522, -366.472437442)):
            Circle(SKETCH13_R)
        with Locations((288.985000522, -425.654437442)):
            Circle(SKETCH13_R)
    extrude(amount=-CUT_EXTRUDE3_DEPTH, mode=Mode.SUBTRACT)

    # Sketch17 → Boss-Extrude12 (add)
    with BuildSketch(Plane(origin=(0, 0, -268.485), x_dir=(-1, 0, 0), z_dir=(0, 0, -1))):
        with Locations((-65.094412808, -395.572437442)):
            Rectangle(SKETCH17_W, SKETCH17_H)
    extrude(amount=BOSS_EXTRUDE12_DEPTH)

    # Sketch16 → Boss-Extrude11 (add)
    with BuildSketch(Plane.XZ.offset(411.896376681)):
        with Locations((62.126450848, -283.316)):
            Rectangle(SKETCH16_W, SKETCH16_H)
    extrude(amount=BOSS_EXTRUDE11_DEPTH)


solid = part.part
